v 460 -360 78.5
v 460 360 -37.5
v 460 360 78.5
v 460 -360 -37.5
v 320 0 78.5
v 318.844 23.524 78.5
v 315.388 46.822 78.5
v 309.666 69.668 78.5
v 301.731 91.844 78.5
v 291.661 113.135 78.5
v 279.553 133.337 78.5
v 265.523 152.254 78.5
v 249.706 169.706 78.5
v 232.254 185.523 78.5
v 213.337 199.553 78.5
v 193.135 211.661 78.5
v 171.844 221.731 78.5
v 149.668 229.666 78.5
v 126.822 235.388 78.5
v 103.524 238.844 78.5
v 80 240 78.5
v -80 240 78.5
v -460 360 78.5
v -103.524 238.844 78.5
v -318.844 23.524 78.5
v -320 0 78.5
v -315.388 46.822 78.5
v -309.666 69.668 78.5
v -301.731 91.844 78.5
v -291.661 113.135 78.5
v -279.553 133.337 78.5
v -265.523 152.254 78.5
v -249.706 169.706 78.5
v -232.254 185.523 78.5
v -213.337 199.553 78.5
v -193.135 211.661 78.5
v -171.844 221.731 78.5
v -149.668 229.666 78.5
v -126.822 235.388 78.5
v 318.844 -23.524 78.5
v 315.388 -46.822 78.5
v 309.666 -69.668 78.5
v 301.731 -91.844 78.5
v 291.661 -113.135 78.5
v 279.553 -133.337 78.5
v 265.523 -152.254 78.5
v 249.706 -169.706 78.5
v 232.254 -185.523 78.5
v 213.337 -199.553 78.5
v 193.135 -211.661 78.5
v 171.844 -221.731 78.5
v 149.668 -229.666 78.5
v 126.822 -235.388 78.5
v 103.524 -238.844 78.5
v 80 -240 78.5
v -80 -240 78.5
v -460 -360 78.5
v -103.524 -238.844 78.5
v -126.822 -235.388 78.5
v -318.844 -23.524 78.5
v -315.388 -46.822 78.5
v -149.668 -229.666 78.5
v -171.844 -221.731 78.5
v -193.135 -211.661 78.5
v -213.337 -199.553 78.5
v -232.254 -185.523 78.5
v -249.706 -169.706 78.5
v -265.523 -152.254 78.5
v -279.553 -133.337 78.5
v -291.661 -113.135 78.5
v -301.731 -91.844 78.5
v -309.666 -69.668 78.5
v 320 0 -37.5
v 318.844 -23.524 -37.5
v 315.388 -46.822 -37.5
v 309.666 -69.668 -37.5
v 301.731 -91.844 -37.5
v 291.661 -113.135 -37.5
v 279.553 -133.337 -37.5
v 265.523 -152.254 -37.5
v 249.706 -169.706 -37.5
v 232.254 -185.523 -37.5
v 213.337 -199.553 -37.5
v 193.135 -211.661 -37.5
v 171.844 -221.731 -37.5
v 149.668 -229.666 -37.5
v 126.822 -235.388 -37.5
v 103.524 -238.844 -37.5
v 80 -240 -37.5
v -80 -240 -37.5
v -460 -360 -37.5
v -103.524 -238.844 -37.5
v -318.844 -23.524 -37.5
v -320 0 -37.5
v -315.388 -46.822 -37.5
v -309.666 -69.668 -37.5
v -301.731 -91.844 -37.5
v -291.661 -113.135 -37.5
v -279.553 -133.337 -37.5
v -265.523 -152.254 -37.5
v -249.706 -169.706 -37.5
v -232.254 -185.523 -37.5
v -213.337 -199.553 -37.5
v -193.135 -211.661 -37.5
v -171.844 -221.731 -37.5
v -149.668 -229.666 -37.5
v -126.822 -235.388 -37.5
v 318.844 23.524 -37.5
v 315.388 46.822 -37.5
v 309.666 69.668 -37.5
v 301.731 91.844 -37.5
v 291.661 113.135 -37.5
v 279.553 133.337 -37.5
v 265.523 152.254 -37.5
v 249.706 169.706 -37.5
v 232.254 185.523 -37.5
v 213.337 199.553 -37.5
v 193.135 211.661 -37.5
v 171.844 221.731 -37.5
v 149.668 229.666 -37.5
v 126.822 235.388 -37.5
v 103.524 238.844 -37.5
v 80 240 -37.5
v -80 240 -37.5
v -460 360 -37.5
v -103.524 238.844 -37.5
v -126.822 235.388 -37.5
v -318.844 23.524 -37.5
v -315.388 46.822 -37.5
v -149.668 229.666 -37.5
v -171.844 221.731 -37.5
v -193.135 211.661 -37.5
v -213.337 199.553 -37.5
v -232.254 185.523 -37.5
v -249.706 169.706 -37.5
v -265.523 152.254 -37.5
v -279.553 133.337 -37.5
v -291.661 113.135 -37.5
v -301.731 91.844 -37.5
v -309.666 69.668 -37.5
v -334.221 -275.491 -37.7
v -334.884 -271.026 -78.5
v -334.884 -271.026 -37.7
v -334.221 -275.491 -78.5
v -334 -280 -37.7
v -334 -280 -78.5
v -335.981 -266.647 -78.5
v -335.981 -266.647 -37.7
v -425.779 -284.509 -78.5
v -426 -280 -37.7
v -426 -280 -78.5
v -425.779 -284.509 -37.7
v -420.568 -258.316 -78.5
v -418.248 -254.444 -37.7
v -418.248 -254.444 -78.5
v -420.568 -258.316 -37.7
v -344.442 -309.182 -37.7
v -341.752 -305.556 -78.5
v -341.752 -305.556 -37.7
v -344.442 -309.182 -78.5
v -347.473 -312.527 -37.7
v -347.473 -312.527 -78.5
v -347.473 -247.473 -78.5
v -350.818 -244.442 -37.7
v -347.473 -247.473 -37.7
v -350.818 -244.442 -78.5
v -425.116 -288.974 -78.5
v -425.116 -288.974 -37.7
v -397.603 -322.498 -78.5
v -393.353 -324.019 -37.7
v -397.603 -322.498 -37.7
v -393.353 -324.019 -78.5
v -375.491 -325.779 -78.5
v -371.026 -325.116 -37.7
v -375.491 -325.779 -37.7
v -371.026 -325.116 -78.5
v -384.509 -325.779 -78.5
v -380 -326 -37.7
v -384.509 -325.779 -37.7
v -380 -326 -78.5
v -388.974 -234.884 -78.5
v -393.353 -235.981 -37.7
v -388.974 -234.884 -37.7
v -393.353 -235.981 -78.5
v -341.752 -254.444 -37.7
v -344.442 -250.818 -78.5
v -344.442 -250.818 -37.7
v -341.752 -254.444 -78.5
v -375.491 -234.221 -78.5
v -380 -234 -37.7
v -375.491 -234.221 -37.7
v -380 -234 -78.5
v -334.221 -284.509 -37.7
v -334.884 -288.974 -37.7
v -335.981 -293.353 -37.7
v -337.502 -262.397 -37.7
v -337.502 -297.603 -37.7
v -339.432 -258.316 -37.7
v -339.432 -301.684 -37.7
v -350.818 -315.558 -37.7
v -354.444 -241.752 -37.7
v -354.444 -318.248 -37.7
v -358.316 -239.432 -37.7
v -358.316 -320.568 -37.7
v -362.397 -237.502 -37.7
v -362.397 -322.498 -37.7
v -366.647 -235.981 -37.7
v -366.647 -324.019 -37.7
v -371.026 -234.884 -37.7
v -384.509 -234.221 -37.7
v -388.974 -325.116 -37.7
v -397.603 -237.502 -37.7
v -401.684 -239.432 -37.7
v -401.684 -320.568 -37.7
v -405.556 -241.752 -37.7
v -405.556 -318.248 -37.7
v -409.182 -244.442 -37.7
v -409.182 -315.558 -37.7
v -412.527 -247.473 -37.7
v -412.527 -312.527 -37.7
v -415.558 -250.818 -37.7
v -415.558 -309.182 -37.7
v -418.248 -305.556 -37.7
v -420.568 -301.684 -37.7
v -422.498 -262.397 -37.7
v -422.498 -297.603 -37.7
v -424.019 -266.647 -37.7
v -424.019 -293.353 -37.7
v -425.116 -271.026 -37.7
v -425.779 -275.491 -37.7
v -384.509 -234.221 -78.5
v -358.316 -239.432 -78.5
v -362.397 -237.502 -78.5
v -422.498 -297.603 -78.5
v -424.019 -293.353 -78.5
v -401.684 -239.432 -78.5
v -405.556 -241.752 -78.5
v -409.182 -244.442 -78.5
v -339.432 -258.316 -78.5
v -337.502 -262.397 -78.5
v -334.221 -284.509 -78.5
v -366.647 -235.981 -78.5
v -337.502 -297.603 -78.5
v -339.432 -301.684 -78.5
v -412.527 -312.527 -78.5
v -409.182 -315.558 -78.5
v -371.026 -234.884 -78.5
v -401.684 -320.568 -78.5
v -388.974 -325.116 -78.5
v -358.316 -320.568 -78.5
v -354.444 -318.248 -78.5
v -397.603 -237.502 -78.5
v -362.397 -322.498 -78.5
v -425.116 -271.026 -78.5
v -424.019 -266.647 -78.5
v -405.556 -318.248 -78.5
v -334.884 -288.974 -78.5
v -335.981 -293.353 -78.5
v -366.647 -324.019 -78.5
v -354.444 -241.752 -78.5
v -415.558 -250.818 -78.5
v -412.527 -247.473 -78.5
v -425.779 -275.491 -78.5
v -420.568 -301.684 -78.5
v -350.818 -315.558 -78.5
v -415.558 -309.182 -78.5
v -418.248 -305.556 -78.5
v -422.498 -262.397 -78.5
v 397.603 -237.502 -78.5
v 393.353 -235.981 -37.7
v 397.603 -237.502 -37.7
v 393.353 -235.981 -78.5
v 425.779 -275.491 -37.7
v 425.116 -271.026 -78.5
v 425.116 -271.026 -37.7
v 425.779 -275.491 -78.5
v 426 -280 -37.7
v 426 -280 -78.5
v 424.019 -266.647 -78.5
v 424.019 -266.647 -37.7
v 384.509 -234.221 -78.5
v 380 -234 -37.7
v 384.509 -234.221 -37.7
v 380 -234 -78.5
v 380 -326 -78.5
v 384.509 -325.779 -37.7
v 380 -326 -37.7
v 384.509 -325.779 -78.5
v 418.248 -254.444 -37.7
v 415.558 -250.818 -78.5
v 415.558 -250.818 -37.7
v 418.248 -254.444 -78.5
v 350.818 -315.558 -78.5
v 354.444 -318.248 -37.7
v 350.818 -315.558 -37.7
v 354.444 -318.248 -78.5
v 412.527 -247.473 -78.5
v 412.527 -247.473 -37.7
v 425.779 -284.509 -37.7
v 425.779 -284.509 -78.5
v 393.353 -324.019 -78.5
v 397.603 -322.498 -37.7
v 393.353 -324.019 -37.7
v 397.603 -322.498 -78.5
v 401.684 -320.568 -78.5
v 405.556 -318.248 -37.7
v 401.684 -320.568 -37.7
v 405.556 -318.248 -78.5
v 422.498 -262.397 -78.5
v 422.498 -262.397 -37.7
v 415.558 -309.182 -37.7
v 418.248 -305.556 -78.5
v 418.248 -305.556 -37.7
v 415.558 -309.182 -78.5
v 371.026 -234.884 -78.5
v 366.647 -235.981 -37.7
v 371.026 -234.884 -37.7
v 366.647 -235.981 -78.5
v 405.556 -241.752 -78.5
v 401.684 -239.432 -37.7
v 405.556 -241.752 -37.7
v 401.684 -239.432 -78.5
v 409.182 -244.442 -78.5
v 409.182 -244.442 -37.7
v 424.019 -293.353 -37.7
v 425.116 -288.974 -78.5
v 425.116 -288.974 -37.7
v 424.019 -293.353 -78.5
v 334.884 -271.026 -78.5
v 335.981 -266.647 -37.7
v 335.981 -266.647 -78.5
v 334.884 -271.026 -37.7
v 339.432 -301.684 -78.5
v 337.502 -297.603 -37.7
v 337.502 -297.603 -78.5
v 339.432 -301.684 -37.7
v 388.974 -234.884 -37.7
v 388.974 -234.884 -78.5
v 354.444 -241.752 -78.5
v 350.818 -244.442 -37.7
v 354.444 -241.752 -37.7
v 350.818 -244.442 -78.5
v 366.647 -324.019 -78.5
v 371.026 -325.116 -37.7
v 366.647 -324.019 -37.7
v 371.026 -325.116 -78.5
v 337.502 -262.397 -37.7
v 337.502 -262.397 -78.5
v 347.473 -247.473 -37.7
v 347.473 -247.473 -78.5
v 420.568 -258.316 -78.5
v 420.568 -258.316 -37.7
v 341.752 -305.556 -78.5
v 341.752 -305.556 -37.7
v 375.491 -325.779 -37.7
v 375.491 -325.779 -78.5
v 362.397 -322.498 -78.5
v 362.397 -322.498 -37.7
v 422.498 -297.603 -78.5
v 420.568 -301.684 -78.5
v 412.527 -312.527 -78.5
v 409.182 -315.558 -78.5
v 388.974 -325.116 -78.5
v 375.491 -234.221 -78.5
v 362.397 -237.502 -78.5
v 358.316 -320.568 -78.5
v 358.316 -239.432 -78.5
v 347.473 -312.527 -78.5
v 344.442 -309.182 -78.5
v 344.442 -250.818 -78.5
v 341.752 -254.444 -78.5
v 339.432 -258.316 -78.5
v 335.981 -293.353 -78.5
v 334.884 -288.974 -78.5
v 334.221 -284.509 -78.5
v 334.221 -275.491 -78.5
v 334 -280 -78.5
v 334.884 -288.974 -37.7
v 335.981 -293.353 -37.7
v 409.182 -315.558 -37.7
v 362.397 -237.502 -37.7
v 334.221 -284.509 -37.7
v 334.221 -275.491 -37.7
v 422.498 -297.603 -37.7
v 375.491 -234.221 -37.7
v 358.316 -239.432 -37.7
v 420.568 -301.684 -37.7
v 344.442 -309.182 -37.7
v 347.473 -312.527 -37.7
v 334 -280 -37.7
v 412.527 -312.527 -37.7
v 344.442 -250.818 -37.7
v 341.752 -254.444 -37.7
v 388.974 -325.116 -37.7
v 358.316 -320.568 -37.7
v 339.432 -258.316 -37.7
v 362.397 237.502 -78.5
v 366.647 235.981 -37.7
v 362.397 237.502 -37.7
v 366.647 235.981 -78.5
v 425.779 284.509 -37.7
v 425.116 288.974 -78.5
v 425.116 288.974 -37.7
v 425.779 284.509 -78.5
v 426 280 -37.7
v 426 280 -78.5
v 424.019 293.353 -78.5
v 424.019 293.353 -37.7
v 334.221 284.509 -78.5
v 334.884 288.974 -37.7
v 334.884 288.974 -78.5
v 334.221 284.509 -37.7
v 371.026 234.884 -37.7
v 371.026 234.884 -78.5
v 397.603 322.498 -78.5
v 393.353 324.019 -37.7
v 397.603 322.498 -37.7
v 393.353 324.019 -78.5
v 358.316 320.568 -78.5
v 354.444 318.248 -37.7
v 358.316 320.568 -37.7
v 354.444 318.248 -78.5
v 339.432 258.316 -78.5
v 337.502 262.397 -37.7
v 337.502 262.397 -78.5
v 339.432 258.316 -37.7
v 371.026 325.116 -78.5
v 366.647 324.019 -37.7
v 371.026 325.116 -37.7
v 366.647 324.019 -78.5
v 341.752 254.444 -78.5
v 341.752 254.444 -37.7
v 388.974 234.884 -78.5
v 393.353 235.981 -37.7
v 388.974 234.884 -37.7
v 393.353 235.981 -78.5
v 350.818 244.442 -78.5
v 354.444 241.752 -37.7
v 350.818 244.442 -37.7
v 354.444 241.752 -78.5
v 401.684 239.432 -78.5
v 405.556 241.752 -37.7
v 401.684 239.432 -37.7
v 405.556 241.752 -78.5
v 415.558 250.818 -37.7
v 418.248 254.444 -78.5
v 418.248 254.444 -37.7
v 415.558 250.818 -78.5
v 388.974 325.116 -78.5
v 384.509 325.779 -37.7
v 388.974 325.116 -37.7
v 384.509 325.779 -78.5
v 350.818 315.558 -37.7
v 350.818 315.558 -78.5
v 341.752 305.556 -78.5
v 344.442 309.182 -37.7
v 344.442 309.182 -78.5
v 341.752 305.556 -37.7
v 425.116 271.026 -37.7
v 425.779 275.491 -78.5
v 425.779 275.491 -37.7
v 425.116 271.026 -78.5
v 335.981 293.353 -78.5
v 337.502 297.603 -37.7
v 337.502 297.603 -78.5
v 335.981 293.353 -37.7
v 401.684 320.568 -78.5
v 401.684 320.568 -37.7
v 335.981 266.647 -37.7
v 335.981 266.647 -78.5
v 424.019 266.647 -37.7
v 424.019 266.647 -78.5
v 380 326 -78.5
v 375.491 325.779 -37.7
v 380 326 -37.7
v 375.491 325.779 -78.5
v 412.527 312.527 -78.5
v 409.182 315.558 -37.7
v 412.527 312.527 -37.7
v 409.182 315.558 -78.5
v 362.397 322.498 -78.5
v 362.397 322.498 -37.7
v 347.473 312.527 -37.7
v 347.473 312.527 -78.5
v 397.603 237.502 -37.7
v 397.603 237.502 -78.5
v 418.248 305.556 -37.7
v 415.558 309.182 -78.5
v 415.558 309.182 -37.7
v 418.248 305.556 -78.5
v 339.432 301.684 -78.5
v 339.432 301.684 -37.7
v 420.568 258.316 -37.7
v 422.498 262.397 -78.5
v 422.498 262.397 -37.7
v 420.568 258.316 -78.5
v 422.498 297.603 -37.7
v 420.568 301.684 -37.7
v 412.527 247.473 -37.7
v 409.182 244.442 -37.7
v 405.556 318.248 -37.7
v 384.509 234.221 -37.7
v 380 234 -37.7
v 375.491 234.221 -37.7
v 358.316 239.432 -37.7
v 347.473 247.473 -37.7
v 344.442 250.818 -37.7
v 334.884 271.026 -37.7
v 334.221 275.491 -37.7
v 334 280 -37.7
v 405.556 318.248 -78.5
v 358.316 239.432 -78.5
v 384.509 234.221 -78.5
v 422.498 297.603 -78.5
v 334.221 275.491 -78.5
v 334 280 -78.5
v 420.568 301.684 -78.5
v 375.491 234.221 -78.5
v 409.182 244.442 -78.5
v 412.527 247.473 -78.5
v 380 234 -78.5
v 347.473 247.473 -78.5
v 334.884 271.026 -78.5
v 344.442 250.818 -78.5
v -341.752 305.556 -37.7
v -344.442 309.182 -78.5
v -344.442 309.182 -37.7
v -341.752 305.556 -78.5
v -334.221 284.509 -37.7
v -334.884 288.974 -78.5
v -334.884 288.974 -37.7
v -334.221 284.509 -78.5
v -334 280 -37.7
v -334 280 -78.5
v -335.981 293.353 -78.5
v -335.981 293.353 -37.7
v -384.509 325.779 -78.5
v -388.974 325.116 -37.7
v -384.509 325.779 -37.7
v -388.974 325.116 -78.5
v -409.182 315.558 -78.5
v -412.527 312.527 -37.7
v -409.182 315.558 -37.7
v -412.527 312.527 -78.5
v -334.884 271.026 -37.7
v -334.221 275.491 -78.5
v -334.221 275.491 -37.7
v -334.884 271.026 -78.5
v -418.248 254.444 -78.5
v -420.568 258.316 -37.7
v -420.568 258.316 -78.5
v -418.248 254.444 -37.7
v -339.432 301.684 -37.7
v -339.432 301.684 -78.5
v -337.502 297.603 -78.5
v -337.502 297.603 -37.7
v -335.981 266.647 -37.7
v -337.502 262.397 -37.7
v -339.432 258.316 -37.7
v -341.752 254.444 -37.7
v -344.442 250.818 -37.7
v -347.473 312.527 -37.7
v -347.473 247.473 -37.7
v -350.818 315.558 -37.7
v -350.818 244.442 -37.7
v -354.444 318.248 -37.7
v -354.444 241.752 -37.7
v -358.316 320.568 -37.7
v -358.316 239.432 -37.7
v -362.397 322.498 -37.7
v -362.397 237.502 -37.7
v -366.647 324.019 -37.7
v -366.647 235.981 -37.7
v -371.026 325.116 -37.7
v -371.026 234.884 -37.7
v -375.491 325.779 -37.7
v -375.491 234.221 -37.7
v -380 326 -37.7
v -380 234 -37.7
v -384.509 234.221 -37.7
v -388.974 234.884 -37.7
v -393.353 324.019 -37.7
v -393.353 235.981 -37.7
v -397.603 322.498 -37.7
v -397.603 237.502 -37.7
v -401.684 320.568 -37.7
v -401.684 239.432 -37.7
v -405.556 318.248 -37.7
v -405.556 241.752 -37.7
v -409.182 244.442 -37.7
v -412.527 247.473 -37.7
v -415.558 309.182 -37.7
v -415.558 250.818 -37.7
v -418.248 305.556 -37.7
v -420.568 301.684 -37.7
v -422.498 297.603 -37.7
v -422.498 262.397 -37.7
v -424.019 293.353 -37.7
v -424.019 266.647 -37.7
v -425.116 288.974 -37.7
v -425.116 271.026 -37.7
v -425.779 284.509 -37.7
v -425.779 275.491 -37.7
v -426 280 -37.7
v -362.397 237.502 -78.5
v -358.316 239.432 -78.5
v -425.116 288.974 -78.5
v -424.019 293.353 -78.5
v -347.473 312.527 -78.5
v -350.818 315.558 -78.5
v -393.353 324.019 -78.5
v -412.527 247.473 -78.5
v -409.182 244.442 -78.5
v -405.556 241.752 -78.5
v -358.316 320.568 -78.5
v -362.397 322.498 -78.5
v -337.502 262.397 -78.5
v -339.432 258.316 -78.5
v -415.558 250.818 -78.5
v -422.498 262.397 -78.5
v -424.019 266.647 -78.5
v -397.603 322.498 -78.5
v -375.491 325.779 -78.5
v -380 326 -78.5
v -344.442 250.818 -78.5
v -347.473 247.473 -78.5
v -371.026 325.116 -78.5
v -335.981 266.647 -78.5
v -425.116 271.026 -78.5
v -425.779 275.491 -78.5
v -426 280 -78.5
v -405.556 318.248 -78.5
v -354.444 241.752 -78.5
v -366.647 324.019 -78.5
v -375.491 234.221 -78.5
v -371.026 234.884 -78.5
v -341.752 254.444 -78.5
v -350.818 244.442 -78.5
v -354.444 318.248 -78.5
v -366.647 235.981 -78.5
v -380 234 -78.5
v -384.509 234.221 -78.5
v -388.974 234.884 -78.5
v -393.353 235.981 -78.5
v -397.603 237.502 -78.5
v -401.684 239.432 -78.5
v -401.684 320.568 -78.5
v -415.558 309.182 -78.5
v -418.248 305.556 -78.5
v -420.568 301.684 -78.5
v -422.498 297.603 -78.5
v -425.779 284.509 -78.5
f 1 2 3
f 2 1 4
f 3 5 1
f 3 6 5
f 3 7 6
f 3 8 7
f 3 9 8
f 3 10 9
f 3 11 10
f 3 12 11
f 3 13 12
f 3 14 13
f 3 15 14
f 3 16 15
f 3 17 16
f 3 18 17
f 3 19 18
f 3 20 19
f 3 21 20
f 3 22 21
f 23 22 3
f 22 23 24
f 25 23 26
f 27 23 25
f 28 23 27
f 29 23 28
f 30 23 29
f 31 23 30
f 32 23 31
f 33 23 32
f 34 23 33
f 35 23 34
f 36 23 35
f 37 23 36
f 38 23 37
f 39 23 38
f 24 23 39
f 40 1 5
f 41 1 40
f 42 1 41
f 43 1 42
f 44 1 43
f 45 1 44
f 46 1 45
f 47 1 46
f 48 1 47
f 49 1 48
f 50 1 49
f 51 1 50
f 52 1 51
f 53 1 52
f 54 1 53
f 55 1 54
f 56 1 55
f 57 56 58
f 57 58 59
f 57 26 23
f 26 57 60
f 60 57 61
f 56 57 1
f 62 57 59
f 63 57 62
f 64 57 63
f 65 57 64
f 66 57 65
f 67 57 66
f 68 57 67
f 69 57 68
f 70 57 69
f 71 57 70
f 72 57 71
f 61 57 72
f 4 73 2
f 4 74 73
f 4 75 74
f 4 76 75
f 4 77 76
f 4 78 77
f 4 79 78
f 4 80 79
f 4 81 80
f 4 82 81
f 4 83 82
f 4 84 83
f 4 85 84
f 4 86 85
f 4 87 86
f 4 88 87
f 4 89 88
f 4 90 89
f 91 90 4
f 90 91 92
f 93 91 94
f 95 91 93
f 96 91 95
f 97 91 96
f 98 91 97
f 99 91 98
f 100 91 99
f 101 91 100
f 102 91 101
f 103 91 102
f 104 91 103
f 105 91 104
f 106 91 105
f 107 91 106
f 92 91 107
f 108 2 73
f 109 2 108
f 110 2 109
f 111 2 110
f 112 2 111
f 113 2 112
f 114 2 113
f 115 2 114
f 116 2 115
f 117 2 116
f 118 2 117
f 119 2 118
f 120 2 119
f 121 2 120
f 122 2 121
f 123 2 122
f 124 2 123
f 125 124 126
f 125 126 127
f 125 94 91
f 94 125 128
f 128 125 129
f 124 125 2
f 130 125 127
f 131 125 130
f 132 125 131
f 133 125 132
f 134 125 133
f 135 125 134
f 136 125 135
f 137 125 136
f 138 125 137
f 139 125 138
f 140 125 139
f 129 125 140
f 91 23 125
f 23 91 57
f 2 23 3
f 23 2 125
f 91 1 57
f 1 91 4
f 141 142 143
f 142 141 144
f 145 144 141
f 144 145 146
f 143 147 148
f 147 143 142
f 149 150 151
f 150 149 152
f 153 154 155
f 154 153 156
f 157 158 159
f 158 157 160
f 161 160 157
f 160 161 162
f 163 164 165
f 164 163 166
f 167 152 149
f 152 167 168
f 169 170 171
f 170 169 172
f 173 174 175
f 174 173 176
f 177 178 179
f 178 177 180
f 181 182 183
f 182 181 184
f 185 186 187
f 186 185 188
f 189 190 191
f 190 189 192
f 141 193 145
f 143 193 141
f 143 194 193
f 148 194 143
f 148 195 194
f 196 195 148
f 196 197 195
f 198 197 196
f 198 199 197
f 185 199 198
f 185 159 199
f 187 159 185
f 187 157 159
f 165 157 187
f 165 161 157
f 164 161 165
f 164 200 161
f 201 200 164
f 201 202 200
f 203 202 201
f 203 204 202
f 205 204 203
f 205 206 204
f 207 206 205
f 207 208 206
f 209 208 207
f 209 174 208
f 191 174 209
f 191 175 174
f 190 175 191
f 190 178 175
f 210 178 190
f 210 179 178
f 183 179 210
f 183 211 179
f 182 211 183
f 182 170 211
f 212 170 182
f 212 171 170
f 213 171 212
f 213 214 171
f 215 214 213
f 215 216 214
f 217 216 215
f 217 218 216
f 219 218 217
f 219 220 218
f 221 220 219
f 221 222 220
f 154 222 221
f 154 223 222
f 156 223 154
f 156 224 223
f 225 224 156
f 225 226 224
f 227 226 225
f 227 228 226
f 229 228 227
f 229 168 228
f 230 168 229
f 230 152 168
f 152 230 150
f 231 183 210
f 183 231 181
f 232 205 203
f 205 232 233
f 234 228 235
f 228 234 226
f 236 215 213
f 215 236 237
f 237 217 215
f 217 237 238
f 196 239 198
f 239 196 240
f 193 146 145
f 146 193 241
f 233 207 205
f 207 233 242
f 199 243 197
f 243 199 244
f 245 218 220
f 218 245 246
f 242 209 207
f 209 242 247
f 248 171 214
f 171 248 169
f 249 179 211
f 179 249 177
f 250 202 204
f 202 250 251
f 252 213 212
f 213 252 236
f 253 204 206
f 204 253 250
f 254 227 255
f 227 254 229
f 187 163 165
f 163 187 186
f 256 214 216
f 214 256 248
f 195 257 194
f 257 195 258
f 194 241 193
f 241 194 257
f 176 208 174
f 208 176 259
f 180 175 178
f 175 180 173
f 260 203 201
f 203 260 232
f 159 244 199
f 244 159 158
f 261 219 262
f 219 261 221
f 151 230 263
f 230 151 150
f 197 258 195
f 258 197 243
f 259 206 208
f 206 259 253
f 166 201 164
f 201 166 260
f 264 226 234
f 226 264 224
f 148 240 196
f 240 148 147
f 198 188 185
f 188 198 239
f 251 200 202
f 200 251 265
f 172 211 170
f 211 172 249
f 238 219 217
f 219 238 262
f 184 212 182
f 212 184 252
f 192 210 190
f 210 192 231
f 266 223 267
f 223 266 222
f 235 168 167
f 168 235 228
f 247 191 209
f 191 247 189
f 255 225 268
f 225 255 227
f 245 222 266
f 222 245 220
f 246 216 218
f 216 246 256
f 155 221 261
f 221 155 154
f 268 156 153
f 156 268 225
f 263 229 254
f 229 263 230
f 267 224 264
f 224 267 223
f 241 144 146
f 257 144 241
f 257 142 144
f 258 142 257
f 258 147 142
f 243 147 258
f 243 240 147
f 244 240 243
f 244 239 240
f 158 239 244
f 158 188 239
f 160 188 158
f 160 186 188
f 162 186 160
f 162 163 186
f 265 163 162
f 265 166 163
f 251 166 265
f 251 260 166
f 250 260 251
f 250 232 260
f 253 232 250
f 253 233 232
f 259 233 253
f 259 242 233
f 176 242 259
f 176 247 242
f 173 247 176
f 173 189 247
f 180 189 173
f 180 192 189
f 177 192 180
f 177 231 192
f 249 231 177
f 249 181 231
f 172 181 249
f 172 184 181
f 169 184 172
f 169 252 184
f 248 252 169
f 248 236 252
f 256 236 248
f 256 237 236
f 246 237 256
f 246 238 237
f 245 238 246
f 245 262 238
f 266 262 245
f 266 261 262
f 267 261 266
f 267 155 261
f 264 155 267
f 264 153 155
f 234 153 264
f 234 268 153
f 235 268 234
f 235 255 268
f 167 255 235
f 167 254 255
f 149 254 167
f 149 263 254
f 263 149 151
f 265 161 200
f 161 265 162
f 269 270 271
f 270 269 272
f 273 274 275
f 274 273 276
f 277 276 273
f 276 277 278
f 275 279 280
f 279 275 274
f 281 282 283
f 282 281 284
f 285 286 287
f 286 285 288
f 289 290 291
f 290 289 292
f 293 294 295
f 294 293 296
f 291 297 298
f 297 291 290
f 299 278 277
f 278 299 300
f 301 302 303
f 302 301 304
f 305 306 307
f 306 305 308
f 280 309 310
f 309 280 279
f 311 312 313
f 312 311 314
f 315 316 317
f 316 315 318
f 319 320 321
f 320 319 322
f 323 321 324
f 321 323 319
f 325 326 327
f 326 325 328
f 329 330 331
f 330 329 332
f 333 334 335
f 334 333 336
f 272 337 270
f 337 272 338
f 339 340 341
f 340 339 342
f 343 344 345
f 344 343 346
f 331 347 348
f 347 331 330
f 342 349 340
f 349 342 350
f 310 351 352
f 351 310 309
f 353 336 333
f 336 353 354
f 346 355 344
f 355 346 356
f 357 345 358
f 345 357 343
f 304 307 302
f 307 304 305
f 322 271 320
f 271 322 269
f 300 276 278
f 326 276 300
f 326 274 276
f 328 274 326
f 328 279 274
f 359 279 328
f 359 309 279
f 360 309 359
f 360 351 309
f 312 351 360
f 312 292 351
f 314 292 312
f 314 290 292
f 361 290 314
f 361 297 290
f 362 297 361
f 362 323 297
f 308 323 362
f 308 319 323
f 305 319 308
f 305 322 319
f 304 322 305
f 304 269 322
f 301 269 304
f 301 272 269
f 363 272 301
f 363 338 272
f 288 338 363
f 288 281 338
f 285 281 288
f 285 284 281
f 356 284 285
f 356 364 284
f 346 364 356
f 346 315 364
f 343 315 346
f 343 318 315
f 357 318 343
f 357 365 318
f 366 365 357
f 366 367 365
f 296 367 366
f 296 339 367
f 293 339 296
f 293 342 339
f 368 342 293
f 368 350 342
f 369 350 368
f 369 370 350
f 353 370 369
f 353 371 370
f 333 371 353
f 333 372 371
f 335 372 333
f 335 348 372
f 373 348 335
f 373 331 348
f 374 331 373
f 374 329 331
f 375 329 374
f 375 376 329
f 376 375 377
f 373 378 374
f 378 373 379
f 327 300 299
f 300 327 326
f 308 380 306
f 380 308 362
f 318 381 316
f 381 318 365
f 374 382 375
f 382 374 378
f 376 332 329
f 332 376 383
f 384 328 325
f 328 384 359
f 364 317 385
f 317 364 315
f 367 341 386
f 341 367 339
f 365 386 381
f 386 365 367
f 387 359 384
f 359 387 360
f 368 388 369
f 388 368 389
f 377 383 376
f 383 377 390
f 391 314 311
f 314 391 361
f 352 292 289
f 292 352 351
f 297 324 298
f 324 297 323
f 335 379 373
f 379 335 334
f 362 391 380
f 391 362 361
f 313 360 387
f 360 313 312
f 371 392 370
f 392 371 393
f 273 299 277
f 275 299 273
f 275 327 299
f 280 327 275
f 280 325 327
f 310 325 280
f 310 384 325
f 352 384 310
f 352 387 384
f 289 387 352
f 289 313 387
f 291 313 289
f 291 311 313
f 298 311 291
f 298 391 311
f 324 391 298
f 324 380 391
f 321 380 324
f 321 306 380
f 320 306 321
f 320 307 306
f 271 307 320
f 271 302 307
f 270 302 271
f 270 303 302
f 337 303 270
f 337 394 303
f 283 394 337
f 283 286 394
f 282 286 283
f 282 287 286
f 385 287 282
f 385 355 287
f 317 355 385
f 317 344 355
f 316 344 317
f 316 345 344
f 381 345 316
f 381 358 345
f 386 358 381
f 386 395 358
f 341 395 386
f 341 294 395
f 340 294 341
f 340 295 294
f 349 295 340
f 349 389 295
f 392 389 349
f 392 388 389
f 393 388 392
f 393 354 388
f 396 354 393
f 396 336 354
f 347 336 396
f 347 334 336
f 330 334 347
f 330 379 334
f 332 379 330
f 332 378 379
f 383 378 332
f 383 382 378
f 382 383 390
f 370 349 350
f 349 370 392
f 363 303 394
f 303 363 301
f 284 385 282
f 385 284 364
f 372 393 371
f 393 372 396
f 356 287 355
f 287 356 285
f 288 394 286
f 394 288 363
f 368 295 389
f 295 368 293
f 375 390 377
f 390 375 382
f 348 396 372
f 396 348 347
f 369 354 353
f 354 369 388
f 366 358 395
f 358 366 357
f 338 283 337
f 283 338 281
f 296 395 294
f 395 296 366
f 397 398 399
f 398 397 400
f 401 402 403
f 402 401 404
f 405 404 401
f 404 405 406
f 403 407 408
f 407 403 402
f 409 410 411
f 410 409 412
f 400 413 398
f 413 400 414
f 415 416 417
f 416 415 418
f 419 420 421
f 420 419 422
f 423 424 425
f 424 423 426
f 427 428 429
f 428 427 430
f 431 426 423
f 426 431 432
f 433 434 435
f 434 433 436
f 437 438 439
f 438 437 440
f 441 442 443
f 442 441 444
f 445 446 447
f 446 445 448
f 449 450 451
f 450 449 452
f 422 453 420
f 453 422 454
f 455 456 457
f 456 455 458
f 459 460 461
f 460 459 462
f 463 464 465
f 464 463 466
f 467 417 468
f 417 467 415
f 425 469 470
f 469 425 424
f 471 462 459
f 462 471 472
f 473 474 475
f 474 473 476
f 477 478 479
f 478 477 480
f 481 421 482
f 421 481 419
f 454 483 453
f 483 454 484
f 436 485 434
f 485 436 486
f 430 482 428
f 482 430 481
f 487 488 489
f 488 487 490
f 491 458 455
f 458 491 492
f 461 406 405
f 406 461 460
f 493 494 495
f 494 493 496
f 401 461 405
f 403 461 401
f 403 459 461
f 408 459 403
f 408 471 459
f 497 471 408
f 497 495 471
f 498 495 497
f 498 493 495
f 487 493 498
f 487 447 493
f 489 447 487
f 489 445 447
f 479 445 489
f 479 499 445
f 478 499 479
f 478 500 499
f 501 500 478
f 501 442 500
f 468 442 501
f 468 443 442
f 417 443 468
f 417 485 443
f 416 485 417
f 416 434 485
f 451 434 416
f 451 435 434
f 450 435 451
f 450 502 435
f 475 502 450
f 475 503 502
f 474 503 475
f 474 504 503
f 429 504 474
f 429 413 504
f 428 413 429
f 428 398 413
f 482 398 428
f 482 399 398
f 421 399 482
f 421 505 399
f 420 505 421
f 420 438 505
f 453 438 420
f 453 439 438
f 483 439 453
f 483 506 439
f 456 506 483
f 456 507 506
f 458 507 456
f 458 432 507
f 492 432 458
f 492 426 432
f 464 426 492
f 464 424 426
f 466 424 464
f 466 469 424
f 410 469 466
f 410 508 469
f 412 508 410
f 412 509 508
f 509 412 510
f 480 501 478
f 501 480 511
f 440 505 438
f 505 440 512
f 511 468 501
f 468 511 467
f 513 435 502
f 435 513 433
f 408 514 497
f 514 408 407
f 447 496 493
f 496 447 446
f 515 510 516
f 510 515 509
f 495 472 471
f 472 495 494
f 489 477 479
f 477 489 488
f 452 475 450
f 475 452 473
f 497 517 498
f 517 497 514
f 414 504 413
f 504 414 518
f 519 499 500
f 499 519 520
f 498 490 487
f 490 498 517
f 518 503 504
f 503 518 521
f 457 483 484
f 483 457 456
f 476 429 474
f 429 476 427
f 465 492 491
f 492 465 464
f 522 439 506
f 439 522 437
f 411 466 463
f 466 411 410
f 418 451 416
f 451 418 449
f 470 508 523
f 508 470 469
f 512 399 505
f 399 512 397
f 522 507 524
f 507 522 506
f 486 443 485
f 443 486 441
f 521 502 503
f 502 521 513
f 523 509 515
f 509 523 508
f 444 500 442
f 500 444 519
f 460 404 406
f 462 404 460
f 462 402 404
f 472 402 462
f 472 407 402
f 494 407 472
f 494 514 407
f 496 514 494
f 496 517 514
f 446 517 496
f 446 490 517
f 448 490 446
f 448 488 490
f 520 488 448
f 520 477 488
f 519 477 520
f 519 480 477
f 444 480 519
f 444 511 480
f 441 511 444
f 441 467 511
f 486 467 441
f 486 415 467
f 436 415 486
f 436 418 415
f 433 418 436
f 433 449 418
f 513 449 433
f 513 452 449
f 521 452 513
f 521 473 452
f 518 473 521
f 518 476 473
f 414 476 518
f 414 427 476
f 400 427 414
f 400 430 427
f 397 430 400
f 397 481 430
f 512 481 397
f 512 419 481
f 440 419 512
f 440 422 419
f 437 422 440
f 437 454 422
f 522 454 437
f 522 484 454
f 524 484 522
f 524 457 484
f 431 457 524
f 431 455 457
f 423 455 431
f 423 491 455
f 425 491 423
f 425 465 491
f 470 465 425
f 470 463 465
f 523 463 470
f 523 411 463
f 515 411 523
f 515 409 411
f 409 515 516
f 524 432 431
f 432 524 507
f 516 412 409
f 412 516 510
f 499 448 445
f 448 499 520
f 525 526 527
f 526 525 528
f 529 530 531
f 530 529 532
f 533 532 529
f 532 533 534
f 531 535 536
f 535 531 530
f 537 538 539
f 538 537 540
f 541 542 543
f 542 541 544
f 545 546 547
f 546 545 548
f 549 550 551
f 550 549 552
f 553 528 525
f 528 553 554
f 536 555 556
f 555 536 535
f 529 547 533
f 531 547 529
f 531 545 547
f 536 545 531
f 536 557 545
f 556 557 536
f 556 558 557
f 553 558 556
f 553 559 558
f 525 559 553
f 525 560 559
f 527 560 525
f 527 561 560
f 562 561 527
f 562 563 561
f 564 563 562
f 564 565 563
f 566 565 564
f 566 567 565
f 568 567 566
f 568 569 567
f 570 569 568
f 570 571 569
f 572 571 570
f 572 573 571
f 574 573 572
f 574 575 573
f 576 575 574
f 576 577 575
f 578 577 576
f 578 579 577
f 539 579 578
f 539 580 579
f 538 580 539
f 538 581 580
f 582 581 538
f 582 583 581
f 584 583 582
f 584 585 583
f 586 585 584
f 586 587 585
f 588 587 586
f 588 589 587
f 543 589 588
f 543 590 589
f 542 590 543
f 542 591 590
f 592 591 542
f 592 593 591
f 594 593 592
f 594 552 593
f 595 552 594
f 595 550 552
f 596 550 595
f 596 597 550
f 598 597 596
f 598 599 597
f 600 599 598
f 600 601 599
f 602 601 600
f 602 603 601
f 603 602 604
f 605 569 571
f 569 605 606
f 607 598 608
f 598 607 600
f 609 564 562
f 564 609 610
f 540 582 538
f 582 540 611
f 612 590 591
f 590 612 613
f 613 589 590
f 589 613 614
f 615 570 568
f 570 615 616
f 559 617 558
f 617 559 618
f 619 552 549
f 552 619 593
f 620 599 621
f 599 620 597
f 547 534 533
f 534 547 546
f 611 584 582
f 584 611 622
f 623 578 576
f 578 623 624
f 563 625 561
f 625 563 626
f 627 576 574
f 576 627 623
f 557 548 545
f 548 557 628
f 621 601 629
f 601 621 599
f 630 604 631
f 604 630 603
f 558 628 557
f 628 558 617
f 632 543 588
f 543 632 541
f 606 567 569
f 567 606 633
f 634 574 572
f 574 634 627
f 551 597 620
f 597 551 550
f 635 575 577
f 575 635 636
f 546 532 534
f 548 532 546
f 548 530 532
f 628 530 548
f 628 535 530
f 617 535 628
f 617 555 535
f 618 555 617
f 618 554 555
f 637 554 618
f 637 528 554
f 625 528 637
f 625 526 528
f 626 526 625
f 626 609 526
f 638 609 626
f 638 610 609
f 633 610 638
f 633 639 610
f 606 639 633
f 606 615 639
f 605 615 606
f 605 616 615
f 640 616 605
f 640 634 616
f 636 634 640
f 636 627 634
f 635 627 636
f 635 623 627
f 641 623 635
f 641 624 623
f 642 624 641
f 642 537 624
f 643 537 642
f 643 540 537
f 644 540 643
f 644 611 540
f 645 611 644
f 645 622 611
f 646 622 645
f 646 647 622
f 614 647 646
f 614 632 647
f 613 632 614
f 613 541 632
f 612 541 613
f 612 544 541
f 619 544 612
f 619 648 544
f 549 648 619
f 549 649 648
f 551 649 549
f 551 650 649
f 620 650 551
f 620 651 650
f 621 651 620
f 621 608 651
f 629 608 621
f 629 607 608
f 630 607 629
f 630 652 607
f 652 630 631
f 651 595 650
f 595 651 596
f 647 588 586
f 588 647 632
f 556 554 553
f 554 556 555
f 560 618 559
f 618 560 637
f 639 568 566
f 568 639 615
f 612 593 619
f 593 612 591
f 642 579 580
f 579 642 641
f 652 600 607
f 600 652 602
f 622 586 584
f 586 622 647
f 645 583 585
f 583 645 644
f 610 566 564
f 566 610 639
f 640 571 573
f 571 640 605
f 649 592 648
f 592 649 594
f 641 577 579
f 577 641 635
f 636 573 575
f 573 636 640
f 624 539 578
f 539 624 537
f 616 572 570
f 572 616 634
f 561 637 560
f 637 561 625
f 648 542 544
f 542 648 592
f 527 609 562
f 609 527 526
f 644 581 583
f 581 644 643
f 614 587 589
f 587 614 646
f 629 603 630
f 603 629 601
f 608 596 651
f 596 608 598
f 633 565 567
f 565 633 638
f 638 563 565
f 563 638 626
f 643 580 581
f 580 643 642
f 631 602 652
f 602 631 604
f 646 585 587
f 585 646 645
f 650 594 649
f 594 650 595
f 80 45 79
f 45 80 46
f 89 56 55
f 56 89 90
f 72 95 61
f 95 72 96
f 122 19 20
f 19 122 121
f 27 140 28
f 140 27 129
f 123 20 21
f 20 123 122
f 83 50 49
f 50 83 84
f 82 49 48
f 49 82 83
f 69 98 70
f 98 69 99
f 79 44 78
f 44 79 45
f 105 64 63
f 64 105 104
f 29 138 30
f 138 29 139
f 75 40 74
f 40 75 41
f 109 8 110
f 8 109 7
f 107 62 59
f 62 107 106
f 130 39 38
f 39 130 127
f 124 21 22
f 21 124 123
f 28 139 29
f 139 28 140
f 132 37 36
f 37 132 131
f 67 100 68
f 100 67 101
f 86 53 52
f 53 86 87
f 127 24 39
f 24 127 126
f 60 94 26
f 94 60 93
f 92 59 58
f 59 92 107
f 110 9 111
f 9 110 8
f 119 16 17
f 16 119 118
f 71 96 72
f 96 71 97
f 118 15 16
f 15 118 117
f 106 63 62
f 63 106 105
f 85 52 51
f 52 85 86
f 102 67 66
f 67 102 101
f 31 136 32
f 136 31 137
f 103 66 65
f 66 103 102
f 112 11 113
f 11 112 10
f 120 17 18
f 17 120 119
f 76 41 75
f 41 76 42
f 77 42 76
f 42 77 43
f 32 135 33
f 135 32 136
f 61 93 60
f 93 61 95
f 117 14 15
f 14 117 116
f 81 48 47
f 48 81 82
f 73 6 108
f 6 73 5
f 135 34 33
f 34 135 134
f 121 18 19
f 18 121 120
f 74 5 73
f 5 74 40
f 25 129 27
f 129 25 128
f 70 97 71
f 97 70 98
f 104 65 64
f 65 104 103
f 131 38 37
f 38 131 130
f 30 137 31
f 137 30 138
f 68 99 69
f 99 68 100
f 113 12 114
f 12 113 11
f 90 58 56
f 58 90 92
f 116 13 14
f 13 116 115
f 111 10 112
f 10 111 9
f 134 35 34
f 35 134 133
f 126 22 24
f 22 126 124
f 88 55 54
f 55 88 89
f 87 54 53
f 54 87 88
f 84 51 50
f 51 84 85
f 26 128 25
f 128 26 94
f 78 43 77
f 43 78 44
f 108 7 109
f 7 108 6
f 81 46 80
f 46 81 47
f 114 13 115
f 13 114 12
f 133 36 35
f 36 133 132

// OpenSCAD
// ============================================================================
// Atom Lithography Machine — Parametric OpenSCAD Module (S4.1-03)
// ============================================================================
// part_id           : S4.1-03
// parent_bom_id     : S4.1
// subsystem         : S4
// part_name         : Yapisal celik alt-sase ve titresim sonumlu terazi ayaklari
// material          : Steel
// temp_stage        : 300 K
// vacuum_grade      : Atmosfer
// tolerance         : ±0.5 mm
// computed_mass_kg  : 200.03671
// envelope_mm       : 932.200 x 720.000 x 157.000
// design_maturity   : M0_M1_DETAILED_CAD_DESIGN_ONLY
// no_lab_measurement: true
// iec61508_certified: false
// semi_s2_certified : false
// Units: millimeters (mm)
// ============================================================================

$fn = 64;

// Nominal bounding envelope parameters (mm)
bbox_x = 932.2000;
bbox_y = 720.0000;
bbox_z = 157.0000;

// Part-specific parametric dimensions
frame_x_mm = 920.0;
frame_y_mm = 720.0;
bay_x_mm = 640.0;
bay_y_mm = 480.0;
load_capacity_kg = 1000;
min_f1_hz = 80.0;

// Interface / port parameters (mm)

module part_S4_1_03() {
  difference() {
    union() {
      // Sand-filled welded 140x116 mm RHS structural steel sub-frame
      translate([0.000, 0.000, 20.500]) cube([920.000, 720.000, 116.000], center=true);
      // M24 vibration-damped leveling soleplate #1
      translate([-380.000, -280.000, -58.100]) cylinder(d=92.000, h=40.800, center=true);
      // M24 vibration-damped leveling soleplate #2
      translate([380.000, -280.000, -58.100]) cylinder(d=92.000, h=40.800, center=true);
      // M24 vibration-damped leveling soleplate #3
      translate([380.000, 280.000, -58.100]) cylinder(d=92.000, h=40.800, center=true);
      // M24 vibration-damped leveling soleplate #4
      translate([-380.000, 280.000, -58.100]) cylinder(d=92.000, h=40.800, center=true);
    }
    // Open 640x480 mm central bay clearing R=210 mm DR OVC bore
    translate([0.000, 0.000, 20.500]) {
      hull() {
        translate([-80.000, 0, 0]) cylinder(d=480.000, h=122.000, center=true);
        translate([80.000, 0, 0]) cylinder(d=480.000, h=122.000, center=true);
      }
    }
  }
}

// World assembly mounting transform (global machine frame, mm / deg):
// translate([0.000, 0.000, -581.500]) rotate([0.000, 0.000, 0.000]) part_S4_1_03();

part_S4_1_03();
